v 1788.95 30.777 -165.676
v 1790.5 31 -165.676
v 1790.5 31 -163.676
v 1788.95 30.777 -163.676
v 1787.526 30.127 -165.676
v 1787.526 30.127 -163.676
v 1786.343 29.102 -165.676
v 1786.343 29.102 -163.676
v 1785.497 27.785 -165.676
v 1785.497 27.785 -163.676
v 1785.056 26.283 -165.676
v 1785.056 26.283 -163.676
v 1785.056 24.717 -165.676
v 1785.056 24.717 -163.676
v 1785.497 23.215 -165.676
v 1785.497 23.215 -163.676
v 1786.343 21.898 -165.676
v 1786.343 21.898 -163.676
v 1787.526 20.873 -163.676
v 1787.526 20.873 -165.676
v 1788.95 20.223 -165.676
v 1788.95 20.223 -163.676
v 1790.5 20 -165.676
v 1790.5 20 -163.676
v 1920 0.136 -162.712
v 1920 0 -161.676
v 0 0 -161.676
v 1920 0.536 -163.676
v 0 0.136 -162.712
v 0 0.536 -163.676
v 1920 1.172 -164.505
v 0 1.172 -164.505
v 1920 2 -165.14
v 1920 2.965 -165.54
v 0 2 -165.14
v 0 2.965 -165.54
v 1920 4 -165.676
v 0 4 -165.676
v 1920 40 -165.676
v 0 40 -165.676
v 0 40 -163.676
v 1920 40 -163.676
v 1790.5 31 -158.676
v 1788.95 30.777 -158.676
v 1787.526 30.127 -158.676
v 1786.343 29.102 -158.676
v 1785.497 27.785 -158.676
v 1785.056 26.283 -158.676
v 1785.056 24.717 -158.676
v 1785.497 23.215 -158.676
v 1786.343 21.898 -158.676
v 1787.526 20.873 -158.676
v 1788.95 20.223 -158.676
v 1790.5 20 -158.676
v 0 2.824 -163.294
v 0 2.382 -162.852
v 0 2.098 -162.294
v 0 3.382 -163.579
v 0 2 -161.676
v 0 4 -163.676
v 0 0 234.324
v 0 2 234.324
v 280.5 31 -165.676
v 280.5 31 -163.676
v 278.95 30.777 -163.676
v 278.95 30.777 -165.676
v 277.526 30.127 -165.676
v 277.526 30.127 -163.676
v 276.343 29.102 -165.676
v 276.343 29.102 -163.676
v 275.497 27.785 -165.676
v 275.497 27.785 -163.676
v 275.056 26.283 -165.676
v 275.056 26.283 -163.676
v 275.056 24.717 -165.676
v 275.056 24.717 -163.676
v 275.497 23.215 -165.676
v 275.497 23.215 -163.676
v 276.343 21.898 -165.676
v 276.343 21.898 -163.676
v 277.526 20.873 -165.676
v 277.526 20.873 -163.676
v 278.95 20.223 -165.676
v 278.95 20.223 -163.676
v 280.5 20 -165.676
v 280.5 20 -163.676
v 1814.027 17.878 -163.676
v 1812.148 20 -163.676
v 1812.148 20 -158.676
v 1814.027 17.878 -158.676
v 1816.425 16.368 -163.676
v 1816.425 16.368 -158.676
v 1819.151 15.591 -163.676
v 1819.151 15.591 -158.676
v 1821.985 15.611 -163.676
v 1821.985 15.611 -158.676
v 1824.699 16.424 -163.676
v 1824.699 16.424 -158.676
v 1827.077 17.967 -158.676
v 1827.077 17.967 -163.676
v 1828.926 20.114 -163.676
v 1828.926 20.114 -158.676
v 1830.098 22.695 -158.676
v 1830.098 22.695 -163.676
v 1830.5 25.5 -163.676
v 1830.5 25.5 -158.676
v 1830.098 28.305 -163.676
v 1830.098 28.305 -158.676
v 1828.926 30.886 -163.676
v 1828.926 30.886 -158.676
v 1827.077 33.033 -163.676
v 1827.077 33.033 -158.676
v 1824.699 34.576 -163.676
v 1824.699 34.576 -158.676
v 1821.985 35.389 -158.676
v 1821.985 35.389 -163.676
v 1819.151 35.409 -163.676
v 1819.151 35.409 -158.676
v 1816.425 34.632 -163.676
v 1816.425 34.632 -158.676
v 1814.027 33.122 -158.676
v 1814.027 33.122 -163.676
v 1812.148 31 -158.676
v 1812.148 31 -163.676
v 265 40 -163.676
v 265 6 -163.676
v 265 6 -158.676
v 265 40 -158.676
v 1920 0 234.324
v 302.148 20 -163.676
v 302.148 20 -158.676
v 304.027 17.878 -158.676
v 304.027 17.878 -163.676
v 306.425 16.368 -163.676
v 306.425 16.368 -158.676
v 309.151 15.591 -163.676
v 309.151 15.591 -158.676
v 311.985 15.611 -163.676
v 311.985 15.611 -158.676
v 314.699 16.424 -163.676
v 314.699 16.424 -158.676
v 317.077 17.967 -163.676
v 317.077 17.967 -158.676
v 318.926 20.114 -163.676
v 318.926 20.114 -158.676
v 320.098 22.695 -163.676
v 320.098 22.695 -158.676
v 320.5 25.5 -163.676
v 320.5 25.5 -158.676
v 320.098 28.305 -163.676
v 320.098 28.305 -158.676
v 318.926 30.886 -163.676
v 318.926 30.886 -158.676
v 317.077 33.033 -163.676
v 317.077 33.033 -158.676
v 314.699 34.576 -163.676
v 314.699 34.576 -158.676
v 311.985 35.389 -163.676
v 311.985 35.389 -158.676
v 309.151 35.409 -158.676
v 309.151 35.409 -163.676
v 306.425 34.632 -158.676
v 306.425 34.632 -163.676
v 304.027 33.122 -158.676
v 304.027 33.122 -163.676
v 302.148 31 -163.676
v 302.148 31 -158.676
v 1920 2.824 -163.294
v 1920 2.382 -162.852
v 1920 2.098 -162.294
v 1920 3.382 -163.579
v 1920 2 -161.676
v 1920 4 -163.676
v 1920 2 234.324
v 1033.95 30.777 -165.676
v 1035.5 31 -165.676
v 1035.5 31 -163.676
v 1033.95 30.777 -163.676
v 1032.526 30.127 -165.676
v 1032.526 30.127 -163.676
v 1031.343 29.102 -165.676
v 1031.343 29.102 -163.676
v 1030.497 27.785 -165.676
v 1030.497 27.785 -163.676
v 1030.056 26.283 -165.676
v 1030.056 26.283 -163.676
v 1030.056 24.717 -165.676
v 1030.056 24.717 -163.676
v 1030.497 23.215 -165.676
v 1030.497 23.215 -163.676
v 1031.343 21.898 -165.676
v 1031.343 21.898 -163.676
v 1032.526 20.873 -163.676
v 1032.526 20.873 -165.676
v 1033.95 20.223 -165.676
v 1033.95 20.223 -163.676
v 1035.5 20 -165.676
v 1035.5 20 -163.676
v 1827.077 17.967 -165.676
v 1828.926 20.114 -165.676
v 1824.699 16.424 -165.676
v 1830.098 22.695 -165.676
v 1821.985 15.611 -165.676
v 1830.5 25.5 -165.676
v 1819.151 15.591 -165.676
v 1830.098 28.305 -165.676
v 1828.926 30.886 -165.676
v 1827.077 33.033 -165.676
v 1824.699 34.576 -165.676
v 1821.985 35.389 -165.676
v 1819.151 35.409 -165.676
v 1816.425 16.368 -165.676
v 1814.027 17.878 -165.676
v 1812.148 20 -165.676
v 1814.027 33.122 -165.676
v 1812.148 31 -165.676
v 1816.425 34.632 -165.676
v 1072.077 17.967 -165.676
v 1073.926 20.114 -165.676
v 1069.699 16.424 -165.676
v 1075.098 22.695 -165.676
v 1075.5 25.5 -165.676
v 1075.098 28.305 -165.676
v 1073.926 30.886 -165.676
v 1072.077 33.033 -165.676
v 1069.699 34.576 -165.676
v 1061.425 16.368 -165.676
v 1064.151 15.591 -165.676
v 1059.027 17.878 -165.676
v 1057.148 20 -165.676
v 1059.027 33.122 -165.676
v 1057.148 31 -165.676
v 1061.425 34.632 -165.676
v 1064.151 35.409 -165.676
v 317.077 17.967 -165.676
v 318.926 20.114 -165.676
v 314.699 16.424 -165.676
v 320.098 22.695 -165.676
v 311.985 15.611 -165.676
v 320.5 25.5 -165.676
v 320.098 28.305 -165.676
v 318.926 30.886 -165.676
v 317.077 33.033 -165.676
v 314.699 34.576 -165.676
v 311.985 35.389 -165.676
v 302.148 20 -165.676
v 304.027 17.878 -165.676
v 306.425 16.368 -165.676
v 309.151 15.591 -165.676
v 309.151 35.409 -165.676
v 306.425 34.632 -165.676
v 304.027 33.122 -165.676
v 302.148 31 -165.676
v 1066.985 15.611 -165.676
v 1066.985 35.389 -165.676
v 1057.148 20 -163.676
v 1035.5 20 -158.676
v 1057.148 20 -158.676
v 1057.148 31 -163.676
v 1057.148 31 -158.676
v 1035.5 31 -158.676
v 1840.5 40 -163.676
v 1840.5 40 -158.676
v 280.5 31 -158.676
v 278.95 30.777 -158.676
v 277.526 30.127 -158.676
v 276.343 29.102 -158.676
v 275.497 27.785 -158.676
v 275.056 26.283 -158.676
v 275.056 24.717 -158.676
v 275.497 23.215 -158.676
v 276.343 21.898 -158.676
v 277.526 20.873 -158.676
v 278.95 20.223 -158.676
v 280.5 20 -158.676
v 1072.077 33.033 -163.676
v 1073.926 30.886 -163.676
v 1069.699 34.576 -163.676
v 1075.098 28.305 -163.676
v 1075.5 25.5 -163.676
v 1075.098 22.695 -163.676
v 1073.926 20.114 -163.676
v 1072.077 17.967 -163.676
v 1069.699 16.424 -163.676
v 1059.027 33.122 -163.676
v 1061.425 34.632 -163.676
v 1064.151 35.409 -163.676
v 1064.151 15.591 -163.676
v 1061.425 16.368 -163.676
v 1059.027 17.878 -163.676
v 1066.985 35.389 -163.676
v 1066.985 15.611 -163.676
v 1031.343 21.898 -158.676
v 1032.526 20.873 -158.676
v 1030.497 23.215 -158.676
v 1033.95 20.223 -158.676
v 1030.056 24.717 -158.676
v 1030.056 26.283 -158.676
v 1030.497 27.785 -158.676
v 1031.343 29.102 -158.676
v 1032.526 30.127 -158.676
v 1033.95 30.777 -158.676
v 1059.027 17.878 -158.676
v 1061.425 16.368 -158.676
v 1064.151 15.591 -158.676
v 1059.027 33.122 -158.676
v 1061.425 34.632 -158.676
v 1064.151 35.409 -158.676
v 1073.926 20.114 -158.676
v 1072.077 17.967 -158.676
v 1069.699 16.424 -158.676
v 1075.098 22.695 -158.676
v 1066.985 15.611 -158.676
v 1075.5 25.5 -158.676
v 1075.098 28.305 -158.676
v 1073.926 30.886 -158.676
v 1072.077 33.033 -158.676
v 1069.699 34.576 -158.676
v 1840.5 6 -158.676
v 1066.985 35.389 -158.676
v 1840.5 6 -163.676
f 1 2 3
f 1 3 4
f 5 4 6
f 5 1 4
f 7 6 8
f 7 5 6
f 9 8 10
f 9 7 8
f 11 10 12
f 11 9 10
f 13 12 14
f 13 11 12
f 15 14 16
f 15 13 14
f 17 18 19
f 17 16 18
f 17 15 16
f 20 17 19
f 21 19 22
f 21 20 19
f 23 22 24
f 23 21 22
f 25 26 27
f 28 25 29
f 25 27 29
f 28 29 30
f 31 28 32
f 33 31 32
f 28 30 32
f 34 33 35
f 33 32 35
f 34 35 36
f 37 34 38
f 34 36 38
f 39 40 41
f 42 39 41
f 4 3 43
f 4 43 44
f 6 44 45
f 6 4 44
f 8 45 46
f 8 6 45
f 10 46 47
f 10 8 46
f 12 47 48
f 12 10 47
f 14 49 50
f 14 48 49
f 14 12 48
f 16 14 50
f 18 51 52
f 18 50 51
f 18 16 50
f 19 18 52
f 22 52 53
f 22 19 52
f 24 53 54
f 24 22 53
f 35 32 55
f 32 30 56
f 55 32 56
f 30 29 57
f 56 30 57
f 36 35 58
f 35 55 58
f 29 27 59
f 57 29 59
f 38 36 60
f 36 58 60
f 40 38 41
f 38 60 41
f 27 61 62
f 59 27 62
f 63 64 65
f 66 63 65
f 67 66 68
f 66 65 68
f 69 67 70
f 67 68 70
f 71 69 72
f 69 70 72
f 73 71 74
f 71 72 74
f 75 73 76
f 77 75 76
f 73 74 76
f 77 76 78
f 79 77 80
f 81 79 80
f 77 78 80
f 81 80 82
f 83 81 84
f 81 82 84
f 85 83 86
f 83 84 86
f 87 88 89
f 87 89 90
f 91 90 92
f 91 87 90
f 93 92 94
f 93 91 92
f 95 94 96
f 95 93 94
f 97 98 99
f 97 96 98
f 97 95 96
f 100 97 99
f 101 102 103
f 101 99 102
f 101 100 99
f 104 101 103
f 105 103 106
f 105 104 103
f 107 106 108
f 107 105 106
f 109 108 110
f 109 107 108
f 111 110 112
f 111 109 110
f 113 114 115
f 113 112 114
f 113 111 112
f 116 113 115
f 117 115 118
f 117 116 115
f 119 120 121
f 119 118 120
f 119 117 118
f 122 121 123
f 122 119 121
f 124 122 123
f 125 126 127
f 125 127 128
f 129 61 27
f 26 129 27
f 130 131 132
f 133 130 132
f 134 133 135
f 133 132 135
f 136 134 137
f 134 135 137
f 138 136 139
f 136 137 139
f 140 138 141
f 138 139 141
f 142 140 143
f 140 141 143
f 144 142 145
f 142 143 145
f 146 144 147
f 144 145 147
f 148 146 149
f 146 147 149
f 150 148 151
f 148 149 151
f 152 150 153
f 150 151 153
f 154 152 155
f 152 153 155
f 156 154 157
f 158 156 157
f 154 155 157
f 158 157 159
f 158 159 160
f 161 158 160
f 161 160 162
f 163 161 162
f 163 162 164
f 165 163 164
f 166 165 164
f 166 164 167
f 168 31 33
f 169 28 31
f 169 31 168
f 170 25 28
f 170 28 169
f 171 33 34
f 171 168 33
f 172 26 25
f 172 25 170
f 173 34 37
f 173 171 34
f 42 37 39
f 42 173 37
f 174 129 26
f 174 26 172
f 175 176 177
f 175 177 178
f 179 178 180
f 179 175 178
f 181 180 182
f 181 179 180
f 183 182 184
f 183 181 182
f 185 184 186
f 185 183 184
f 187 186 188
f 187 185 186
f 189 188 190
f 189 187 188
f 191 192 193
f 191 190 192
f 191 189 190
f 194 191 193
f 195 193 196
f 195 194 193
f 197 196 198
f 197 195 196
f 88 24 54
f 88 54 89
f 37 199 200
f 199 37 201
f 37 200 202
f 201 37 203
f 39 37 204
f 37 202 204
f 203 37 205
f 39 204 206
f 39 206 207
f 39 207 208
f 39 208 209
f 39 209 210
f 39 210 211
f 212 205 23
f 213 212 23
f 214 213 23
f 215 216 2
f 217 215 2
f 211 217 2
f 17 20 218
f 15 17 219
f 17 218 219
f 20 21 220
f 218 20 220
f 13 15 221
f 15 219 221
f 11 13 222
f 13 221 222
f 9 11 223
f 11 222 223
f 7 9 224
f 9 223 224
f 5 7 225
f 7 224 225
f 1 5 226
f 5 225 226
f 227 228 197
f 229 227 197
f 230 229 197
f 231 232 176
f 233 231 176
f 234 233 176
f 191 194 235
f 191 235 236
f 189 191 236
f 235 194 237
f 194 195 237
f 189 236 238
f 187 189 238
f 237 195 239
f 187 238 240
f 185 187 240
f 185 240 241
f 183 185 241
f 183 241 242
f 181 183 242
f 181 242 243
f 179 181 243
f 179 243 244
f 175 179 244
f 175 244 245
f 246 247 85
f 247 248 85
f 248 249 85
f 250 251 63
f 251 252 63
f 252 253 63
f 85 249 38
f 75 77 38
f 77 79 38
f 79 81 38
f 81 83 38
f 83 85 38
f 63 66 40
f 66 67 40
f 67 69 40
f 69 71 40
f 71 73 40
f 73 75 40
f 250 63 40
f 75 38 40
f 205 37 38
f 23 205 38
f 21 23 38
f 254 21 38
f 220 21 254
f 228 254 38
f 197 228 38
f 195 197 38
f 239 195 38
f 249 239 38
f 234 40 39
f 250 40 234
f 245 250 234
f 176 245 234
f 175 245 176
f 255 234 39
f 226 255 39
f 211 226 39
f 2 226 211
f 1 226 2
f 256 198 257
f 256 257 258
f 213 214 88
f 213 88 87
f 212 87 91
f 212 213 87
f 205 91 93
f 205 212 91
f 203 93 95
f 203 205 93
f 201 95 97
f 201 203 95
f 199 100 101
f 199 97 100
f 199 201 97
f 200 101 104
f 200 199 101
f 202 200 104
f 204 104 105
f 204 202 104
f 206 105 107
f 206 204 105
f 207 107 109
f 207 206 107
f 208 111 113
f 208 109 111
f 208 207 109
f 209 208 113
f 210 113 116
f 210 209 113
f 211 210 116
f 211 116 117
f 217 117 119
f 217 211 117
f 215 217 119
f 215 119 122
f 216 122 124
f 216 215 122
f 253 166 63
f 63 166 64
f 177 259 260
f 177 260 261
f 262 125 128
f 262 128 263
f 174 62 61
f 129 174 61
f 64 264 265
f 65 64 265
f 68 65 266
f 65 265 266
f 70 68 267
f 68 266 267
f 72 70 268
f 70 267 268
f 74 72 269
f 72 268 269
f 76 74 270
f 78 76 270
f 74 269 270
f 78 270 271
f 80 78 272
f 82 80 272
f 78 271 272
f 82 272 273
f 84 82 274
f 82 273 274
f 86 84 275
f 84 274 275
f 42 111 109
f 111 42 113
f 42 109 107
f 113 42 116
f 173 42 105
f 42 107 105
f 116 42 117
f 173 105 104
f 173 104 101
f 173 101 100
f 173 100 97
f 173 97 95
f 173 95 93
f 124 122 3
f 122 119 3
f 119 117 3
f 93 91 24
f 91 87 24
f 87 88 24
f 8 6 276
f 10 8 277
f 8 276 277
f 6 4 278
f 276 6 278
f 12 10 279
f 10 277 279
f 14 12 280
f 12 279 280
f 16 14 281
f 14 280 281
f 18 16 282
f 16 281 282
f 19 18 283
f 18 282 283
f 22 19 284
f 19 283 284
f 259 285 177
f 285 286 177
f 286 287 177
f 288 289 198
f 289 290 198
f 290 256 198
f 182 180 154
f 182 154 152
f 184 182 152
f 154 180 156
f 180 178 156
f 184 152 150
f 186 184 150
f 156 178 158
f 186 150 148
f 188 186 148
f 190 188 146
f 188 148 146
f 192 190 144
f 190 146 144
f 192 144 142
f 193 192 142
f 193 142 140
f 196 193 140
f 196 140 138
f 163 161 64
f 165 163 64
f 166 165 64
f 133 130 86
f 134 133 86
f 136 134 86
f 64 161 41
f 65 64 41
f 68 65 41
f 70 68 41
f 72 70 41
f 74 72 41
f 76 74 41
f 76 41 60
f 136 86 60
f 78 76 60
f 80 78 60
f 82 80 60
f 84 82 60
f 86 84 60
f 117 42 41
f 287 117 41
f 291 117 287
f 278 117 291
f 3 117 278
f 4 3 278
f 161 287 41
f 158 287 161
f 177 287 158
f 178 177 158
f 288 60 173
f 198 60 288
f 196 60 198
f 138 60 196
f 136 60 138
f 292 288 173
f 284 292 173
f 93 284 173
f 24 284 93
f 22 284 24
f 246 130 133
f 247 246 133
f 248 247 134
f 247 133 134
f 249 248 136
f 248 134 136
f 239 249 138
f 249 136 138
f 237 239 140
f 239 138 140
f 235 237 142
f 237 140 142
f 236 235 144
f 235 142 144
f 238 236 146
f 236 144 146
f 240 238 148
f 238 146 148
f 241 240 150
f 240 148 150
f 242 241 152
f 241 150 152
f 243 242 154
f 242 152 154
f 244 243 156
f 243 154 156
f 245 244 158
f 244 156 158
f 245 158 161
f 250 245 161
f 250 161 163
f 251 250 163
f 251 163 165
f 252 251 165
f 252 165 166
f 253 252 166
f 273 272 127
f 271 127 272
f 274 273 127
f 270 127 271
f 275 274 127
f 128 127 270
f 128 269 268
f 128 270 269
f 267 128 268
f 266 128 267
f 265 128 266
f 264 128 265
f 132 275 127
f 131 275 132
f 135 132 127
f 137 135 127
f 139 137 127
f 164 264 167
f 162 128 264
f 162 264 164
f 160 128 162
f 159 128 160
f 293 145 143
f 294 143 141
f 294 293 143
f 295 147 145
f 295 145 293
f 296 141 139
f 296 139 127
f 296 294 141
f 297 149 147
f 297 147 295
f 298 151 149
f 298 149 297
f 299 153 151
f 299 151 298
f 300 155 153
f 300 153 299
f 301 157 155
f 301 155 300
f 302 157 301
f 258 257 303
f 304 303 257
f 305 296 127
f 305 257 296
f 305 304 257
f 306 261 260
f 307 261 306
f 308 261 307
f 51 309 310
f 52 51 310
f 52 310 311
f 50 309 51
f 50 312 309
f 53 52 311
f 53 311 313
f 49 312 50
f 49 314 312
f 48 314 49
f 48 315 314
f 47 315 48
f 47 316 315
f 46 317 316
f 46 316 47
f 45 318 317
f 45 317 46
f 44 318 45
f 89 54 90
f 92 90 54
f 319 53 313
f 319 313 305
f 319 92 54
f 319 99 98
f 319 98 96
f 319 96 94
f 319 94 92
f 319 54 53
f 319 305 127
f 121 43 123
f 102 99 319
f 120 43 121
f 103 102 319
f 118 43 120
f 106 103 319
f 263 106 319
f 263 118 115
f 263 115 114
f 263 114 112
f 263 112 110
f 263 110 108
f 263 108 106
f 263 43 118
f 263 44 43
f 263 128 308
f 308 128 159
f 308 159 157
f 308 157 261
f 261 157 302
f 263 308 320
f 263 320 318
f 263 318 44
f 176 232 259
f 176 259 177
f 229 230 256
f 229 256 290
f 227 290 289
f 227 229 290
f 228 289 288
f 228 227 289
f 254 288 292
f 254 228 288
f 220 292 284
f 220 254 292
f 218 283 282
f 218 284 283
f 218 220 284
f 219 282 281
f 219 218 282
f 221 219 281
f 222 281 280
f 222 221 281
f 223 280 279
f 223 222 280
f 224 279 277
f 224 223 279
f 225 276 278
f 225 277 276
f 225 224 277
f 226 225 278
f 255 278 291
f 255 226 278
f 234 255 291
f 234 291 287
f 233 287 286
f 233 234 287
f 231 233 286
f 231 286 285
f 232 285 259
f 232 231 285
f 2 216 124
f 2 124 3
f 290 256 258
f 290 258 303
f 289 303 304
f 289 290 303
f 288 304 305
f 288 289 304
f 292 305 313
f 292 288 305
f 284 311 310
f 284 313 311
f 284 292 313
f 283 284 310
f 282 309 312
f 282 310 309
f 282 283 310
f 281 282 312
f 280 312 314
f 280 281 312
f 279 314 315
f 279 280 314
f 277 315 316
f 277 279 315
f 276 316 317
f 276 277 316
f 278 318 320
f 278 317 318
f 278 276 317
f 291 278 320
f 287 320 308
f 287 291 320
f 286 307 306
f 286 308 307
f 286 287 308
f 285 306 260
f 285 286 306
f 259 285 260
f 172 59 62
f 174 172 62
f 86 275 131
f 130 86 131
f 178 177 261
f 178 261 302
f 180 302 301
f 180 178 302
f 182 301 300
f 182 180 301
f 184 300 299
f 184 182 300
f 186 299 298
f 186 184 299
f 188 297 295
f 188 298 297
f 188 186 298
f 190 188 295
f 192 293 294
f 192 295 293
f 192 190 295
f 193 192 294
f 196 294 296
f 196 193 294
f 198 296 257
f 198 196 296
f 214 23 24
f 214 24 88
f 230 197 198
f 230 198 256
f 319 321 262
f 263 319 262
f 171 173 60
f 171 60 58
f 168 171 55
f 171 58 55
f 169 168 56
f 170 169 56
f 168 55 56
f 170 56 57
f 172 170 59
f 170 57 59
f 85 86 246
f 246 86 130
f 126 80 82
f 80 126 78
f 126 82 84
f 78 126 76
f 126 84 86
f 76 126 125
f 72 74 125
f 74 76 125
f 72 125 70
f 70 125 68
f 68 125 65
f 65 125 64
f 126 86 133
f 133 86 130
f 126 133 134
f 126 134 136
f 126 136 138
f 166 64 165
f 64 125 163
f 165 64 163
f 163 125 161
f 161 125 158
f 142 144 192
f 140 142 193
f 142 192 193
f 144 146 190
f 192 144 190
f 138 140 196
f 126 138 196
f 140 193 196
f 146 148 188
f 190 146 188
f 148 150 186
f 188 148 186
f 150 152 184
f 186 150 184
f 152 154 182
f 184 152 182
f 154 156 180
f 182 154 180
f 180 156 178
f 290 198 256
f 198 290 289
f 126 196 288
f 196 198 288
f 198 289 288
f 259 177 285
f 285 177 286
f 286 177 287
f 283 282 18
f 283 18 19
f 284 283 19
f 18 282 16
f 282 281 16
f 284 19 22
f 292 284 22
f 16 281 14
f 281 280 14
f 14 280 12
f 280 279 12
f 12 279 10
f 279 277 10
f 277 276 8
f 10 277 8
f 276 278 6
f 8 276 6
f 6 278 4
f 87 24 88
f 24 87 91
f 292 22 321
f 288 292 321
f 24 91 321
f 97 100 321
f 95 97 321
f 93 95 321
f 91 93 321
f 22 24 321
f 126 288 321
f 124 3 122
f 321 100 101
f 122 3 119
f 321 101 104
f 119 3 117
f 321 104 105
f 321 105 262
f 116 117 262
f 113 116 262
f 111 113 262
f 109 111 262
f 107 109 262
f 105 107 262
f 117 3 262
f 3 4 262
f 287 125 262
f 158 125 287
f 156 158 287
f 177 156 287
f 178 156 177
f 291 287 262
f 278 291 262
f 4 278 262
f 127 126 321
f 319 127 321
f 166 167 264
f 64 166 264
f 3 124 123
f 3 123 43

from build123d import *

# Parameters (mm, degrees)
F1_DEPTH = 1920
F3_W     = 1575.5
F3_H     = 34
F4_DEPTH = 5
F5_DEPTH = 12.5
F6_DEPTH = 12.5


with BuildPart() as f1:
    # F0 (on Right) → F1 (new body)
    with BuildSketch(Plane.YZ):
        with BuildLine():
            Line((1.9999950999, 234.3236088878), (0, 234.3236088878))
            Line((0, 234.3236088878), (0, -161.6763911122))
            ThreePointArc((0, -161.6763911122), (1.1715728753, -164.5048182369), (4, -165.6763911122))
            Line((4, -165.6763911122), (40, -165.6763911122))
            Line((40, -165.6763911122), (40, -163.6763960123))
            Line((40, -163.6763960123), (4, -163.6763960123))
            ThreePointArc((4, -163.6763960123), (2.5857829727, -163.0906081395), (1.9999950999, -161.6763911122))
            Line((1.9999950999, -161.6763911122), (1.9999950999, 234.3236088878))
        make_face()
    extrude(amount=F1_DEPTH)


with BuildPart() as f4:
    # F3 (on face) → F4 (new body)
    with BuildSketch(Plane.XY.offset(-163.6763960123)):
        with Locations((1052.75, 23)):
            Rectangle(F3_W, F3_H)
    extrude(amount=F4_DEPTH)


with BuildPart() as f5_tool:
    # F2 (on face) → F5 (new body, symmetric)
    with BuildSketch(Plane.XY.offset(-163.6763960123)):
        with BuildLine():
            Line((1790.5, 20), (1812.1483534558, 20))
            ThreePointArc((1812.1483534558, 20), (1830.5, 25.5), (1812.1483534558, 31))
            Line((1812.1483534558, 31), (1790.5, 31))
            ThreePointArc((1790.5, 31), (1785, 25.5), (1790.5, 20))
        make_face()
        with BuildLine():
            Line((1035.5, 20), (1057.1483534558, 20))
            ThreePointArc((1057.1483534558, 20), (1075.5, 25.5), (1057.1483534558, 31))
            Line((1057.1483534558, 31), (1035.5, 31))
            ThreePointArc((1035.5, 31), (1030, 25.5), (1035.5, 20))
        make_face()
        with BuildLine():
            Line((280.5, 20), (302.1483534558, 20))
            ThreePointArc((302.1483534558, 20), (320.5, 25.5), (302.1483534558, 31))
            Line((302.1483534558, 31), (280.5, 31))
            ThreePointArc((280.5, 31), (275, 25.5), (280.5, 20))
        make_face()
    extrude(amount=F5_DEPTH, both=True)


with BuildPart() as f1_1:
    add(f1.part)

    # F5: cut by f5_tool
    add(f5_tool.part, mode=Mode.SUBTRACT)

    # F2 (on face) → F6 (cut, symmetric)
    with BuildSketch(Plane.XY.offset(-163.6763960123)):
        with BuildLine():
            Line((1790.5, 20), (1812.1483534558, 20))
            ThreePointArc((1812.1483534558, 20), (1830.5, 25.5), (1812.1483534558, 31))
            Line((1812.1483534558, 31), (1790.5, 31))
            ThreePointArc((1790.5, 31), (1785, 25.5), (1790.5, 20))
        make_face()
        with BuildLine():
            Line((1035.5, 20), (1057.1483534558, 20))
            ThreePointArc((1057.1483534558, 20), (1075.5, 25.5), (1057.1483534558, 31))
            Line((1057.1483534558, 31), (1035.5, 31))
            ThreePointArc((1035.5, 31), (1030, 25.5), (1035.5, 20))
        make_face()
        with BuildLine():
            Line((280.5, 20), (302.1483534558, 20))
            ThreePointArc((302.1483534558, 20), (320.5, 25.5), (302.1483534558, 31))
            Line((302.1483534558, 31), (280.5, 31))
            ThreePointArc((280.5, 31), (275, 25.5), (280.5, 20))
        make_face()
    extrude(amount=F6_DEPTH, both=True, mode=Mode.SUBTRACT)


with BuildPart() as f4_1:
    add(f4.part)

    # F5: cut by f5_tool
    add(f5_tool.part, mode=Mode.SUBTRACT)


solid = Compound([f1_1.part, f4_1.part])
